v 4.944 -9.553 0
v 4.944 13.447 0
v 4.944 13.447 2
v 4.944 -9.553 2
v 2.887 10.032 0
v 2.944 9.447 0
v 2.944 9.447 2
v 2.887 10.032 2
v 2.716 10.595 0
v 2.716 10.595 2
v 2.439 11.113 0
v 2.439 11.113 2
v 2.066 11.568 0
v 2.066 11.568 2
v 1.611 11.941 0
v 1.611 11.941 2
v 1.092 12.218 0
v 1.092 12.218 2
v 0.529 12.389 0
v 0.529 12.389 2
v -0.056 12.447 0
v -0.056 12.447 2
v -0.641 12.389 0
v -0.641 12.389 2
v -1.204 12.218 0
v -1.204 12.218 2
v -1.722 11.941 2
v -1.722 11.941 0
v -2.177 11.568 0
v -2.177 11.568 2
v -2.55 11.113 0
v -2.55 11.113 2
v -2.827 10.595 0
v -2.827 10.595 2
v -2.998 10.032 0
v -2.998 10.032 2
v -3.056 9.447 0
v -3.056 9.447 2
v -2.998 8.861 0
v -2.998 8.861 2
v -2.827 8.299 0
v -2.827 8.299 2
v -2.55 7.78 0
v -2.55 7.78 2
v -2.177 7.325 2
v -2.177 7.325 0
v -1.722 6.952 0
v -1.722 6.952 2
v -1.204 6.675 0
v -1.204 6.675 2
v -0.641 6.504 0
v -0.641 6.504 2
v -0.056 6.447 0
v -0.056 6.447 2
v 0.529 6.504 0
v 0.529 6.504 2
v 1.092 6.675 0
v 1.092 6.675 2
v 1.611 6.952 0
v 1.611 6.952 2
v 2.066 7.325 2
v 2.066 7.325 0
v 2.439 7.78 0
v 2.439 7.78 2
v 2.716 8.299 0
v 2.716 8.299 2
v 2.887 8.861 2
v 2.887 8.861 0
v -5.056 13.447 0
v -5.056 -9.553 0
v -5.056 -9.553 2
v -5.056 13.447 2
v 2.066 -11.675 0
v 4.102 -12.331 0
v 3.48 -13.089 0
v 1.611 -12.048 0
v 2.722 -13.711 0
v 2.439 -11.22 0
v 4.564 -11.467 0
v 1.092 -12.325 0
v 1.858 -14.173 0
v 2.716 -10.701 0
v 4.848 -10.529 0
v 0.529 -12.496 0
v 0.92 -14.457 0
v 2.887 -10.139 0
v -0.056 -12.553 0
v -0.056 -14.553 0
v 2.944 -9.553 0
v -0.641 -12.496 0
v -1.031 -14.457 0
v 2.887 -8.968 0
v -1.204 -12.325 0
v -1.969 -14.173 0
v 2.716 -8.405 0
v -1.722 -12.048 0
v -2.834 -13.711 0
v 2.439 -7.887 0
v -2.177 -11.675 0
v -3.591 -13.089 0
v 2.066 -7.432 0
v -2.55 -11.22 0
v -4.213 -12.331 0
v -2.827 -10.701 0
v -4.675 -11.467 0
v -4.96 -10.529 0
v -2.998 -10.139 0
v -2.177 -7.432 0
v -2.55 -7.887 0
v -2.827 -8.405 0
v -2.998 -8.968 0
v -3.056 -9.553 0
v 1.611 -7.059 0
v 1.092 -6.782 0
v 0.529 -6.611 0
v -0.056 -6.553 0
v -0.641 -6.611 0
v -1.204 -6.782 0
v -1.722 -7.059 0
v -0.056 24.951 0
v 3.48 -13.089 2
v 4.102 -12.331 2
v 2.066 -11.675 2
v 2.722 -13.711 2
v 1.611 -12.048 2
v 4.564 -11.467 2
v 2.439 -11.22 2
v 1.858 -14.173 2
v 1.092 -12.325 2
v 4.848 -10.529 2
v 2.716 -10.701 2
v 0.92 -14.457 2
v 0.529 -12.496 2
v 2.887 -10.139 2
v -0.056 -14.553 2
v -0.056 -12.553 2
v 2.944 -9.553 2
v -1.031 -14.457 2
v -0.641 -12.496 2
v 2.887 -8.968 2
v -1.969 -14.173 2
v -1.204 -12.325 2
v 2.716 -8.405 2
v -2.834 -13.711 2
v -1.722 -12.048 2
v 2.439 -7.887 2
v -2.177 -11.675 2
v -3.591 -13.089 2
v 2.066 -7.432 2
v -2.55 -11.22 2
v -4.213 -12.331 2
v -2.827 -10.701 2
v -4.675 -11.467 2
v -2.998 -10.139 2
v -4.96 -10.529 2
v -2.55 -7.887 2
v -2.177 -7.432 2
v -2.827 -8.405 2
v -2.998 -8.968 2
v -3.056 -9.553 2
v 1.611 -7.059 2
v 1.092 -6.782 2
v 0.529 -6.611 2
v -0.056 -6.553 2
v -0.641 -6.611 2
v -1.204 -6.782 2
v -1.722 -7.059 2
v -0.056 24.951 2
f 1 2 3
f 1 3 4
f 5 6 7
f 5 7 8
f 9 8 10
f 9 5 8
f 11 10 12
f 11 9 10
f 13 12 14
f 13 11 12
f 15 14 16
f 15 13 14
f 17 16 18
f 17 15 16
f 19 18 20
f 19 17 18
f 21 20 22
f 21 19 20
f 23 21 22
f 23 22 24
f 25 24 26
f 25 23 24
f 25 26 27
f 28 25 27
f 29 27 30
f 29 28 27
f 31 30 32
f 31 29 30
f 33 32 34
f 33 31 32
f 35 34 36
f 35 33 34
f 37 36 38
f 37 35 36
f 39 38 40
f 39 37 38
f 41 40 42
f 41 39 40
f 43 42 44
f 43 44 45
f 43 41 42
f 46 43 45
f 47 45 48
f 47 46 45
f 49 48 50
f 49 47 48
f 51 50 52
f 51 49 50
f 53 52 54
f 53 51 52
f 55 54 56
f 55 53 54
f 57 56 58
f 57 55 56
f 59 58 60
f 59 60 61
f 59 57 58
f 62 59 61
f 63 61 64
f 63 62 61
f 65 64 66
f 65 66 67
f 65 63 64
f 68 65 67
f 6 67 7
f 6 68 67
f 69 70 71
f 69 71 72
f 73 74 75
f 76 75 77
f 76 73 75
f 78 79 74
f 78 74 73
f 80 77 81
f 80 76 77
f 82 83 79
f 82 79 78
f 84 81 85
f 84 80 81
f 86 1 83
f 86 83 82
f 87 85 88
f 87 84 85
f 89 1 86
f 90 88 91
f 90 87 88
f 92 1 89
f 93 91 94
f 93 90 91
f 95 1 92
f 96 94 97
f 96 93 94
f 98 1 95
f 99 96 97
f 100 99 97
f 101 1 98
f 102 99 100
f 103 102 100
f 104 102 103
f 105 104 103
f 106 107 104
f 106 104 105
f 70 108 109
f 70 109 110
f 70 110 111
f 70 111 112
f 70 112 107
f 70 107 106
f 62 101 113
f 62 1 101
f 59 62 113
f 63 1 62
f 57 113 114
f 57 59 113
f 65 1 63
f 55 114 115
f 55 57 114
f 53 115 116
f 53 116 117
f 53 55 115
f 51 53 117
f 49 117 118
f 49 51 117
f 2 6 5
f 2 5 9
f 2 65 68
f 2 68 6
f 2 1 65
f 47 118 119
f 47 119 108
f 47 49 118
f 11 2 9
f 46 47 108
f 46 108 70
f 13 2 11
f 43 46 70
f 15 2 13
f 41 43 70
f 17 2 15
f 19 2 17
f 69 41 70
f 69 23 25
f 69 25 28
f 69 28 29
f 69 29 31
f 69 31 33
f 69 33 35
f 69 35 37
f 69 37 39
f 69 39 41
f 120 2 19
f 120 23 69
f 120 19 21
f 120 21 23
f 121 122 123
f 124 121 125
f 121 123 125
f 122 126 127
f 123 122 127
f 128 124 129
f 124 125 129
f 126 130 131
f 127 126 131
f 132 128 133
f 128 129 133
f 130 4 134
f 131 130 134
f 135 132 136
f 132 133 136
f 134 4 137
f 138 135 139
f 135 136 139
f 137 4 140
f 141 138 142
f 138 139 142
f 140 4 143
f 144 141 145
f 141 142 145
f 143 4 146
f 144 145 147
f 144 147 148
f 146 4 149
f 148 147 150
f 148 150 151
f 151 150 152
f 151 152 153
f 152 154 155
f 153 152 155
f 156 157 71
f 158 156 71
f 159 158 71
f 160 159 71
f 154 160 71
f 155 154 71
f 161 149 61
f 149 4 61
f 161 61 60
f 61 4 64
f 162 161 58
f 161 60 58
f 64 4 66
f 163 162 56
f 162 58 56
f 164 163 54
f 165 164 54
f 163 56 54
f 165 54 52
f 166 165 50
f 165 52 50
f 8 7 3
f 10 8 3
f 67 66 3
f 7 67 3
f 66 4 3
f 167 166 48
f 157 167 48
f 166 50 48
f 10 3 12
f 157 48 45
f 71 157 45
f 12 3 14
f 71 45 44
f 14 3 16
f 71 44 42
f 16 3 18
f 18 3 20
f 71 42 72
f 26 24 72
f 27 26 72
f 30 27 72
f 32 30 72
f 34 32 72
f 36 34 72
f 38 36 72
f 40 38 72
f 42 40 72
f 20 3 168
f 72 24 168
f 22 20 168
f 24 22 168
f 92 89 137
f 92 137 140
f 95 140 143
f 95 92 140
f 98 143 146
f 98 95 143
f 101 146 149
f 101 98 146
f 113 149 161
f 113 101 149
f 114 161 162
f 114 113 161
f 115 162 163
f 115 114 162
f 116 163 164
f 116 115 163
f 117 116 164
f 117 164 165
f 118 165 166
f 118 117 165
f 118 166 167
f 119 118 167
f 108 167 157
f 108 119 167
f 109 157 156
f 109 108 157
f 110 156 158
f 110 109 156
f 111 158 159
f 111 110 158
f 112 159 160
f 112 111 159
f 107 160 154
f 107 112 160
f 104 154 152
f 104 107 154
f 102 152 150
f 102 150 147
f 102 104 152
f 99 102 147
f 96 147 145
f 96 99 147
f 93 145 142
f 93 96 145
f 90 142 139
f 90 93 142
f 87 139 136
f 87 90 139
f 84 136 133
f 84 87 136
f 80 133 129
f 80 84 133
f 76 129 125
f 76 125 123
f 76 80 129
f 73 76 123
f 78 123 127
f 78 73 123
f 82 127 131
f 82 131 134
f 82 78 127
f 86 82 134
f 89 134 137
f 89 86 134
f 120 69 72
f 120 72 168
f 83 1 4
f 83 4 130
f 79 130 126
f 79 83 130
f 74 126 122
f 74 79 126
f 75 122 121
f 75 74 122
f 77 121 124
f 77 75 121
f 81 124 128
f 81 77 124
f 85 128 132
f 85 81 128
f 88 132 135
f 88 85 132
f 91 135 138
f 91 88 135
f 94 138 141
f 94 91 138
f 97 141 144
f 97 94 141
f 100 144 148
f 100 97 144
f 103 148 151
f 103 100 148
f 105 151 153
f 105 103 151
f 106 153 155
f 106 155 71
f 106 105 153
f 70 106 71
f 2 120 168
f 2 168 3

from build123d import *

# Parameters (mm, degrees)
SKETCH_1_R      = 3
EXTRUDE_1_DEPTH = 2


with BuildPart() as part:
    # 草图1 → 凸台-拉伸1 (new body)
    with BuildSketch(Plane.XY):
        with BuildLine():
            Line((4.944222113, 9.446585585), (4.944222113, -9.553414415))
            ThreePointArc((4.944222113, -9.553414415), (-0.055777887, -14.553414415), (-5.055777887, -9.553414415))
            Line((-5.055777887, -9.553414415), (-5.055777887, 9.446585585))
            Line((-5.055777887, 9.446585585), (-5.055777887, 13.446585585))
            Line((-5.055777887, 13.446585585), (-0.055777887, 24.950641748))
            Line((-0.055777887, 24.950641748), (4.944222113, 13.446585585))
            Line((4.944222113, 13.446585585), (4.944222113, 9.446585585))
        make_face()
        with Locations((-0.055777887, 9.446585585)):
            Circle(SKETCH_1_R, mode=Mode.SUBTRACT)
        with Locations((-0.055777887, -9.553414415)):
            Circle(SKETCH_1_R, mode=Mode.SUBTRACT)
    extrude(amount=EXTRUDE_1_DEPTH)


solid = part.part
